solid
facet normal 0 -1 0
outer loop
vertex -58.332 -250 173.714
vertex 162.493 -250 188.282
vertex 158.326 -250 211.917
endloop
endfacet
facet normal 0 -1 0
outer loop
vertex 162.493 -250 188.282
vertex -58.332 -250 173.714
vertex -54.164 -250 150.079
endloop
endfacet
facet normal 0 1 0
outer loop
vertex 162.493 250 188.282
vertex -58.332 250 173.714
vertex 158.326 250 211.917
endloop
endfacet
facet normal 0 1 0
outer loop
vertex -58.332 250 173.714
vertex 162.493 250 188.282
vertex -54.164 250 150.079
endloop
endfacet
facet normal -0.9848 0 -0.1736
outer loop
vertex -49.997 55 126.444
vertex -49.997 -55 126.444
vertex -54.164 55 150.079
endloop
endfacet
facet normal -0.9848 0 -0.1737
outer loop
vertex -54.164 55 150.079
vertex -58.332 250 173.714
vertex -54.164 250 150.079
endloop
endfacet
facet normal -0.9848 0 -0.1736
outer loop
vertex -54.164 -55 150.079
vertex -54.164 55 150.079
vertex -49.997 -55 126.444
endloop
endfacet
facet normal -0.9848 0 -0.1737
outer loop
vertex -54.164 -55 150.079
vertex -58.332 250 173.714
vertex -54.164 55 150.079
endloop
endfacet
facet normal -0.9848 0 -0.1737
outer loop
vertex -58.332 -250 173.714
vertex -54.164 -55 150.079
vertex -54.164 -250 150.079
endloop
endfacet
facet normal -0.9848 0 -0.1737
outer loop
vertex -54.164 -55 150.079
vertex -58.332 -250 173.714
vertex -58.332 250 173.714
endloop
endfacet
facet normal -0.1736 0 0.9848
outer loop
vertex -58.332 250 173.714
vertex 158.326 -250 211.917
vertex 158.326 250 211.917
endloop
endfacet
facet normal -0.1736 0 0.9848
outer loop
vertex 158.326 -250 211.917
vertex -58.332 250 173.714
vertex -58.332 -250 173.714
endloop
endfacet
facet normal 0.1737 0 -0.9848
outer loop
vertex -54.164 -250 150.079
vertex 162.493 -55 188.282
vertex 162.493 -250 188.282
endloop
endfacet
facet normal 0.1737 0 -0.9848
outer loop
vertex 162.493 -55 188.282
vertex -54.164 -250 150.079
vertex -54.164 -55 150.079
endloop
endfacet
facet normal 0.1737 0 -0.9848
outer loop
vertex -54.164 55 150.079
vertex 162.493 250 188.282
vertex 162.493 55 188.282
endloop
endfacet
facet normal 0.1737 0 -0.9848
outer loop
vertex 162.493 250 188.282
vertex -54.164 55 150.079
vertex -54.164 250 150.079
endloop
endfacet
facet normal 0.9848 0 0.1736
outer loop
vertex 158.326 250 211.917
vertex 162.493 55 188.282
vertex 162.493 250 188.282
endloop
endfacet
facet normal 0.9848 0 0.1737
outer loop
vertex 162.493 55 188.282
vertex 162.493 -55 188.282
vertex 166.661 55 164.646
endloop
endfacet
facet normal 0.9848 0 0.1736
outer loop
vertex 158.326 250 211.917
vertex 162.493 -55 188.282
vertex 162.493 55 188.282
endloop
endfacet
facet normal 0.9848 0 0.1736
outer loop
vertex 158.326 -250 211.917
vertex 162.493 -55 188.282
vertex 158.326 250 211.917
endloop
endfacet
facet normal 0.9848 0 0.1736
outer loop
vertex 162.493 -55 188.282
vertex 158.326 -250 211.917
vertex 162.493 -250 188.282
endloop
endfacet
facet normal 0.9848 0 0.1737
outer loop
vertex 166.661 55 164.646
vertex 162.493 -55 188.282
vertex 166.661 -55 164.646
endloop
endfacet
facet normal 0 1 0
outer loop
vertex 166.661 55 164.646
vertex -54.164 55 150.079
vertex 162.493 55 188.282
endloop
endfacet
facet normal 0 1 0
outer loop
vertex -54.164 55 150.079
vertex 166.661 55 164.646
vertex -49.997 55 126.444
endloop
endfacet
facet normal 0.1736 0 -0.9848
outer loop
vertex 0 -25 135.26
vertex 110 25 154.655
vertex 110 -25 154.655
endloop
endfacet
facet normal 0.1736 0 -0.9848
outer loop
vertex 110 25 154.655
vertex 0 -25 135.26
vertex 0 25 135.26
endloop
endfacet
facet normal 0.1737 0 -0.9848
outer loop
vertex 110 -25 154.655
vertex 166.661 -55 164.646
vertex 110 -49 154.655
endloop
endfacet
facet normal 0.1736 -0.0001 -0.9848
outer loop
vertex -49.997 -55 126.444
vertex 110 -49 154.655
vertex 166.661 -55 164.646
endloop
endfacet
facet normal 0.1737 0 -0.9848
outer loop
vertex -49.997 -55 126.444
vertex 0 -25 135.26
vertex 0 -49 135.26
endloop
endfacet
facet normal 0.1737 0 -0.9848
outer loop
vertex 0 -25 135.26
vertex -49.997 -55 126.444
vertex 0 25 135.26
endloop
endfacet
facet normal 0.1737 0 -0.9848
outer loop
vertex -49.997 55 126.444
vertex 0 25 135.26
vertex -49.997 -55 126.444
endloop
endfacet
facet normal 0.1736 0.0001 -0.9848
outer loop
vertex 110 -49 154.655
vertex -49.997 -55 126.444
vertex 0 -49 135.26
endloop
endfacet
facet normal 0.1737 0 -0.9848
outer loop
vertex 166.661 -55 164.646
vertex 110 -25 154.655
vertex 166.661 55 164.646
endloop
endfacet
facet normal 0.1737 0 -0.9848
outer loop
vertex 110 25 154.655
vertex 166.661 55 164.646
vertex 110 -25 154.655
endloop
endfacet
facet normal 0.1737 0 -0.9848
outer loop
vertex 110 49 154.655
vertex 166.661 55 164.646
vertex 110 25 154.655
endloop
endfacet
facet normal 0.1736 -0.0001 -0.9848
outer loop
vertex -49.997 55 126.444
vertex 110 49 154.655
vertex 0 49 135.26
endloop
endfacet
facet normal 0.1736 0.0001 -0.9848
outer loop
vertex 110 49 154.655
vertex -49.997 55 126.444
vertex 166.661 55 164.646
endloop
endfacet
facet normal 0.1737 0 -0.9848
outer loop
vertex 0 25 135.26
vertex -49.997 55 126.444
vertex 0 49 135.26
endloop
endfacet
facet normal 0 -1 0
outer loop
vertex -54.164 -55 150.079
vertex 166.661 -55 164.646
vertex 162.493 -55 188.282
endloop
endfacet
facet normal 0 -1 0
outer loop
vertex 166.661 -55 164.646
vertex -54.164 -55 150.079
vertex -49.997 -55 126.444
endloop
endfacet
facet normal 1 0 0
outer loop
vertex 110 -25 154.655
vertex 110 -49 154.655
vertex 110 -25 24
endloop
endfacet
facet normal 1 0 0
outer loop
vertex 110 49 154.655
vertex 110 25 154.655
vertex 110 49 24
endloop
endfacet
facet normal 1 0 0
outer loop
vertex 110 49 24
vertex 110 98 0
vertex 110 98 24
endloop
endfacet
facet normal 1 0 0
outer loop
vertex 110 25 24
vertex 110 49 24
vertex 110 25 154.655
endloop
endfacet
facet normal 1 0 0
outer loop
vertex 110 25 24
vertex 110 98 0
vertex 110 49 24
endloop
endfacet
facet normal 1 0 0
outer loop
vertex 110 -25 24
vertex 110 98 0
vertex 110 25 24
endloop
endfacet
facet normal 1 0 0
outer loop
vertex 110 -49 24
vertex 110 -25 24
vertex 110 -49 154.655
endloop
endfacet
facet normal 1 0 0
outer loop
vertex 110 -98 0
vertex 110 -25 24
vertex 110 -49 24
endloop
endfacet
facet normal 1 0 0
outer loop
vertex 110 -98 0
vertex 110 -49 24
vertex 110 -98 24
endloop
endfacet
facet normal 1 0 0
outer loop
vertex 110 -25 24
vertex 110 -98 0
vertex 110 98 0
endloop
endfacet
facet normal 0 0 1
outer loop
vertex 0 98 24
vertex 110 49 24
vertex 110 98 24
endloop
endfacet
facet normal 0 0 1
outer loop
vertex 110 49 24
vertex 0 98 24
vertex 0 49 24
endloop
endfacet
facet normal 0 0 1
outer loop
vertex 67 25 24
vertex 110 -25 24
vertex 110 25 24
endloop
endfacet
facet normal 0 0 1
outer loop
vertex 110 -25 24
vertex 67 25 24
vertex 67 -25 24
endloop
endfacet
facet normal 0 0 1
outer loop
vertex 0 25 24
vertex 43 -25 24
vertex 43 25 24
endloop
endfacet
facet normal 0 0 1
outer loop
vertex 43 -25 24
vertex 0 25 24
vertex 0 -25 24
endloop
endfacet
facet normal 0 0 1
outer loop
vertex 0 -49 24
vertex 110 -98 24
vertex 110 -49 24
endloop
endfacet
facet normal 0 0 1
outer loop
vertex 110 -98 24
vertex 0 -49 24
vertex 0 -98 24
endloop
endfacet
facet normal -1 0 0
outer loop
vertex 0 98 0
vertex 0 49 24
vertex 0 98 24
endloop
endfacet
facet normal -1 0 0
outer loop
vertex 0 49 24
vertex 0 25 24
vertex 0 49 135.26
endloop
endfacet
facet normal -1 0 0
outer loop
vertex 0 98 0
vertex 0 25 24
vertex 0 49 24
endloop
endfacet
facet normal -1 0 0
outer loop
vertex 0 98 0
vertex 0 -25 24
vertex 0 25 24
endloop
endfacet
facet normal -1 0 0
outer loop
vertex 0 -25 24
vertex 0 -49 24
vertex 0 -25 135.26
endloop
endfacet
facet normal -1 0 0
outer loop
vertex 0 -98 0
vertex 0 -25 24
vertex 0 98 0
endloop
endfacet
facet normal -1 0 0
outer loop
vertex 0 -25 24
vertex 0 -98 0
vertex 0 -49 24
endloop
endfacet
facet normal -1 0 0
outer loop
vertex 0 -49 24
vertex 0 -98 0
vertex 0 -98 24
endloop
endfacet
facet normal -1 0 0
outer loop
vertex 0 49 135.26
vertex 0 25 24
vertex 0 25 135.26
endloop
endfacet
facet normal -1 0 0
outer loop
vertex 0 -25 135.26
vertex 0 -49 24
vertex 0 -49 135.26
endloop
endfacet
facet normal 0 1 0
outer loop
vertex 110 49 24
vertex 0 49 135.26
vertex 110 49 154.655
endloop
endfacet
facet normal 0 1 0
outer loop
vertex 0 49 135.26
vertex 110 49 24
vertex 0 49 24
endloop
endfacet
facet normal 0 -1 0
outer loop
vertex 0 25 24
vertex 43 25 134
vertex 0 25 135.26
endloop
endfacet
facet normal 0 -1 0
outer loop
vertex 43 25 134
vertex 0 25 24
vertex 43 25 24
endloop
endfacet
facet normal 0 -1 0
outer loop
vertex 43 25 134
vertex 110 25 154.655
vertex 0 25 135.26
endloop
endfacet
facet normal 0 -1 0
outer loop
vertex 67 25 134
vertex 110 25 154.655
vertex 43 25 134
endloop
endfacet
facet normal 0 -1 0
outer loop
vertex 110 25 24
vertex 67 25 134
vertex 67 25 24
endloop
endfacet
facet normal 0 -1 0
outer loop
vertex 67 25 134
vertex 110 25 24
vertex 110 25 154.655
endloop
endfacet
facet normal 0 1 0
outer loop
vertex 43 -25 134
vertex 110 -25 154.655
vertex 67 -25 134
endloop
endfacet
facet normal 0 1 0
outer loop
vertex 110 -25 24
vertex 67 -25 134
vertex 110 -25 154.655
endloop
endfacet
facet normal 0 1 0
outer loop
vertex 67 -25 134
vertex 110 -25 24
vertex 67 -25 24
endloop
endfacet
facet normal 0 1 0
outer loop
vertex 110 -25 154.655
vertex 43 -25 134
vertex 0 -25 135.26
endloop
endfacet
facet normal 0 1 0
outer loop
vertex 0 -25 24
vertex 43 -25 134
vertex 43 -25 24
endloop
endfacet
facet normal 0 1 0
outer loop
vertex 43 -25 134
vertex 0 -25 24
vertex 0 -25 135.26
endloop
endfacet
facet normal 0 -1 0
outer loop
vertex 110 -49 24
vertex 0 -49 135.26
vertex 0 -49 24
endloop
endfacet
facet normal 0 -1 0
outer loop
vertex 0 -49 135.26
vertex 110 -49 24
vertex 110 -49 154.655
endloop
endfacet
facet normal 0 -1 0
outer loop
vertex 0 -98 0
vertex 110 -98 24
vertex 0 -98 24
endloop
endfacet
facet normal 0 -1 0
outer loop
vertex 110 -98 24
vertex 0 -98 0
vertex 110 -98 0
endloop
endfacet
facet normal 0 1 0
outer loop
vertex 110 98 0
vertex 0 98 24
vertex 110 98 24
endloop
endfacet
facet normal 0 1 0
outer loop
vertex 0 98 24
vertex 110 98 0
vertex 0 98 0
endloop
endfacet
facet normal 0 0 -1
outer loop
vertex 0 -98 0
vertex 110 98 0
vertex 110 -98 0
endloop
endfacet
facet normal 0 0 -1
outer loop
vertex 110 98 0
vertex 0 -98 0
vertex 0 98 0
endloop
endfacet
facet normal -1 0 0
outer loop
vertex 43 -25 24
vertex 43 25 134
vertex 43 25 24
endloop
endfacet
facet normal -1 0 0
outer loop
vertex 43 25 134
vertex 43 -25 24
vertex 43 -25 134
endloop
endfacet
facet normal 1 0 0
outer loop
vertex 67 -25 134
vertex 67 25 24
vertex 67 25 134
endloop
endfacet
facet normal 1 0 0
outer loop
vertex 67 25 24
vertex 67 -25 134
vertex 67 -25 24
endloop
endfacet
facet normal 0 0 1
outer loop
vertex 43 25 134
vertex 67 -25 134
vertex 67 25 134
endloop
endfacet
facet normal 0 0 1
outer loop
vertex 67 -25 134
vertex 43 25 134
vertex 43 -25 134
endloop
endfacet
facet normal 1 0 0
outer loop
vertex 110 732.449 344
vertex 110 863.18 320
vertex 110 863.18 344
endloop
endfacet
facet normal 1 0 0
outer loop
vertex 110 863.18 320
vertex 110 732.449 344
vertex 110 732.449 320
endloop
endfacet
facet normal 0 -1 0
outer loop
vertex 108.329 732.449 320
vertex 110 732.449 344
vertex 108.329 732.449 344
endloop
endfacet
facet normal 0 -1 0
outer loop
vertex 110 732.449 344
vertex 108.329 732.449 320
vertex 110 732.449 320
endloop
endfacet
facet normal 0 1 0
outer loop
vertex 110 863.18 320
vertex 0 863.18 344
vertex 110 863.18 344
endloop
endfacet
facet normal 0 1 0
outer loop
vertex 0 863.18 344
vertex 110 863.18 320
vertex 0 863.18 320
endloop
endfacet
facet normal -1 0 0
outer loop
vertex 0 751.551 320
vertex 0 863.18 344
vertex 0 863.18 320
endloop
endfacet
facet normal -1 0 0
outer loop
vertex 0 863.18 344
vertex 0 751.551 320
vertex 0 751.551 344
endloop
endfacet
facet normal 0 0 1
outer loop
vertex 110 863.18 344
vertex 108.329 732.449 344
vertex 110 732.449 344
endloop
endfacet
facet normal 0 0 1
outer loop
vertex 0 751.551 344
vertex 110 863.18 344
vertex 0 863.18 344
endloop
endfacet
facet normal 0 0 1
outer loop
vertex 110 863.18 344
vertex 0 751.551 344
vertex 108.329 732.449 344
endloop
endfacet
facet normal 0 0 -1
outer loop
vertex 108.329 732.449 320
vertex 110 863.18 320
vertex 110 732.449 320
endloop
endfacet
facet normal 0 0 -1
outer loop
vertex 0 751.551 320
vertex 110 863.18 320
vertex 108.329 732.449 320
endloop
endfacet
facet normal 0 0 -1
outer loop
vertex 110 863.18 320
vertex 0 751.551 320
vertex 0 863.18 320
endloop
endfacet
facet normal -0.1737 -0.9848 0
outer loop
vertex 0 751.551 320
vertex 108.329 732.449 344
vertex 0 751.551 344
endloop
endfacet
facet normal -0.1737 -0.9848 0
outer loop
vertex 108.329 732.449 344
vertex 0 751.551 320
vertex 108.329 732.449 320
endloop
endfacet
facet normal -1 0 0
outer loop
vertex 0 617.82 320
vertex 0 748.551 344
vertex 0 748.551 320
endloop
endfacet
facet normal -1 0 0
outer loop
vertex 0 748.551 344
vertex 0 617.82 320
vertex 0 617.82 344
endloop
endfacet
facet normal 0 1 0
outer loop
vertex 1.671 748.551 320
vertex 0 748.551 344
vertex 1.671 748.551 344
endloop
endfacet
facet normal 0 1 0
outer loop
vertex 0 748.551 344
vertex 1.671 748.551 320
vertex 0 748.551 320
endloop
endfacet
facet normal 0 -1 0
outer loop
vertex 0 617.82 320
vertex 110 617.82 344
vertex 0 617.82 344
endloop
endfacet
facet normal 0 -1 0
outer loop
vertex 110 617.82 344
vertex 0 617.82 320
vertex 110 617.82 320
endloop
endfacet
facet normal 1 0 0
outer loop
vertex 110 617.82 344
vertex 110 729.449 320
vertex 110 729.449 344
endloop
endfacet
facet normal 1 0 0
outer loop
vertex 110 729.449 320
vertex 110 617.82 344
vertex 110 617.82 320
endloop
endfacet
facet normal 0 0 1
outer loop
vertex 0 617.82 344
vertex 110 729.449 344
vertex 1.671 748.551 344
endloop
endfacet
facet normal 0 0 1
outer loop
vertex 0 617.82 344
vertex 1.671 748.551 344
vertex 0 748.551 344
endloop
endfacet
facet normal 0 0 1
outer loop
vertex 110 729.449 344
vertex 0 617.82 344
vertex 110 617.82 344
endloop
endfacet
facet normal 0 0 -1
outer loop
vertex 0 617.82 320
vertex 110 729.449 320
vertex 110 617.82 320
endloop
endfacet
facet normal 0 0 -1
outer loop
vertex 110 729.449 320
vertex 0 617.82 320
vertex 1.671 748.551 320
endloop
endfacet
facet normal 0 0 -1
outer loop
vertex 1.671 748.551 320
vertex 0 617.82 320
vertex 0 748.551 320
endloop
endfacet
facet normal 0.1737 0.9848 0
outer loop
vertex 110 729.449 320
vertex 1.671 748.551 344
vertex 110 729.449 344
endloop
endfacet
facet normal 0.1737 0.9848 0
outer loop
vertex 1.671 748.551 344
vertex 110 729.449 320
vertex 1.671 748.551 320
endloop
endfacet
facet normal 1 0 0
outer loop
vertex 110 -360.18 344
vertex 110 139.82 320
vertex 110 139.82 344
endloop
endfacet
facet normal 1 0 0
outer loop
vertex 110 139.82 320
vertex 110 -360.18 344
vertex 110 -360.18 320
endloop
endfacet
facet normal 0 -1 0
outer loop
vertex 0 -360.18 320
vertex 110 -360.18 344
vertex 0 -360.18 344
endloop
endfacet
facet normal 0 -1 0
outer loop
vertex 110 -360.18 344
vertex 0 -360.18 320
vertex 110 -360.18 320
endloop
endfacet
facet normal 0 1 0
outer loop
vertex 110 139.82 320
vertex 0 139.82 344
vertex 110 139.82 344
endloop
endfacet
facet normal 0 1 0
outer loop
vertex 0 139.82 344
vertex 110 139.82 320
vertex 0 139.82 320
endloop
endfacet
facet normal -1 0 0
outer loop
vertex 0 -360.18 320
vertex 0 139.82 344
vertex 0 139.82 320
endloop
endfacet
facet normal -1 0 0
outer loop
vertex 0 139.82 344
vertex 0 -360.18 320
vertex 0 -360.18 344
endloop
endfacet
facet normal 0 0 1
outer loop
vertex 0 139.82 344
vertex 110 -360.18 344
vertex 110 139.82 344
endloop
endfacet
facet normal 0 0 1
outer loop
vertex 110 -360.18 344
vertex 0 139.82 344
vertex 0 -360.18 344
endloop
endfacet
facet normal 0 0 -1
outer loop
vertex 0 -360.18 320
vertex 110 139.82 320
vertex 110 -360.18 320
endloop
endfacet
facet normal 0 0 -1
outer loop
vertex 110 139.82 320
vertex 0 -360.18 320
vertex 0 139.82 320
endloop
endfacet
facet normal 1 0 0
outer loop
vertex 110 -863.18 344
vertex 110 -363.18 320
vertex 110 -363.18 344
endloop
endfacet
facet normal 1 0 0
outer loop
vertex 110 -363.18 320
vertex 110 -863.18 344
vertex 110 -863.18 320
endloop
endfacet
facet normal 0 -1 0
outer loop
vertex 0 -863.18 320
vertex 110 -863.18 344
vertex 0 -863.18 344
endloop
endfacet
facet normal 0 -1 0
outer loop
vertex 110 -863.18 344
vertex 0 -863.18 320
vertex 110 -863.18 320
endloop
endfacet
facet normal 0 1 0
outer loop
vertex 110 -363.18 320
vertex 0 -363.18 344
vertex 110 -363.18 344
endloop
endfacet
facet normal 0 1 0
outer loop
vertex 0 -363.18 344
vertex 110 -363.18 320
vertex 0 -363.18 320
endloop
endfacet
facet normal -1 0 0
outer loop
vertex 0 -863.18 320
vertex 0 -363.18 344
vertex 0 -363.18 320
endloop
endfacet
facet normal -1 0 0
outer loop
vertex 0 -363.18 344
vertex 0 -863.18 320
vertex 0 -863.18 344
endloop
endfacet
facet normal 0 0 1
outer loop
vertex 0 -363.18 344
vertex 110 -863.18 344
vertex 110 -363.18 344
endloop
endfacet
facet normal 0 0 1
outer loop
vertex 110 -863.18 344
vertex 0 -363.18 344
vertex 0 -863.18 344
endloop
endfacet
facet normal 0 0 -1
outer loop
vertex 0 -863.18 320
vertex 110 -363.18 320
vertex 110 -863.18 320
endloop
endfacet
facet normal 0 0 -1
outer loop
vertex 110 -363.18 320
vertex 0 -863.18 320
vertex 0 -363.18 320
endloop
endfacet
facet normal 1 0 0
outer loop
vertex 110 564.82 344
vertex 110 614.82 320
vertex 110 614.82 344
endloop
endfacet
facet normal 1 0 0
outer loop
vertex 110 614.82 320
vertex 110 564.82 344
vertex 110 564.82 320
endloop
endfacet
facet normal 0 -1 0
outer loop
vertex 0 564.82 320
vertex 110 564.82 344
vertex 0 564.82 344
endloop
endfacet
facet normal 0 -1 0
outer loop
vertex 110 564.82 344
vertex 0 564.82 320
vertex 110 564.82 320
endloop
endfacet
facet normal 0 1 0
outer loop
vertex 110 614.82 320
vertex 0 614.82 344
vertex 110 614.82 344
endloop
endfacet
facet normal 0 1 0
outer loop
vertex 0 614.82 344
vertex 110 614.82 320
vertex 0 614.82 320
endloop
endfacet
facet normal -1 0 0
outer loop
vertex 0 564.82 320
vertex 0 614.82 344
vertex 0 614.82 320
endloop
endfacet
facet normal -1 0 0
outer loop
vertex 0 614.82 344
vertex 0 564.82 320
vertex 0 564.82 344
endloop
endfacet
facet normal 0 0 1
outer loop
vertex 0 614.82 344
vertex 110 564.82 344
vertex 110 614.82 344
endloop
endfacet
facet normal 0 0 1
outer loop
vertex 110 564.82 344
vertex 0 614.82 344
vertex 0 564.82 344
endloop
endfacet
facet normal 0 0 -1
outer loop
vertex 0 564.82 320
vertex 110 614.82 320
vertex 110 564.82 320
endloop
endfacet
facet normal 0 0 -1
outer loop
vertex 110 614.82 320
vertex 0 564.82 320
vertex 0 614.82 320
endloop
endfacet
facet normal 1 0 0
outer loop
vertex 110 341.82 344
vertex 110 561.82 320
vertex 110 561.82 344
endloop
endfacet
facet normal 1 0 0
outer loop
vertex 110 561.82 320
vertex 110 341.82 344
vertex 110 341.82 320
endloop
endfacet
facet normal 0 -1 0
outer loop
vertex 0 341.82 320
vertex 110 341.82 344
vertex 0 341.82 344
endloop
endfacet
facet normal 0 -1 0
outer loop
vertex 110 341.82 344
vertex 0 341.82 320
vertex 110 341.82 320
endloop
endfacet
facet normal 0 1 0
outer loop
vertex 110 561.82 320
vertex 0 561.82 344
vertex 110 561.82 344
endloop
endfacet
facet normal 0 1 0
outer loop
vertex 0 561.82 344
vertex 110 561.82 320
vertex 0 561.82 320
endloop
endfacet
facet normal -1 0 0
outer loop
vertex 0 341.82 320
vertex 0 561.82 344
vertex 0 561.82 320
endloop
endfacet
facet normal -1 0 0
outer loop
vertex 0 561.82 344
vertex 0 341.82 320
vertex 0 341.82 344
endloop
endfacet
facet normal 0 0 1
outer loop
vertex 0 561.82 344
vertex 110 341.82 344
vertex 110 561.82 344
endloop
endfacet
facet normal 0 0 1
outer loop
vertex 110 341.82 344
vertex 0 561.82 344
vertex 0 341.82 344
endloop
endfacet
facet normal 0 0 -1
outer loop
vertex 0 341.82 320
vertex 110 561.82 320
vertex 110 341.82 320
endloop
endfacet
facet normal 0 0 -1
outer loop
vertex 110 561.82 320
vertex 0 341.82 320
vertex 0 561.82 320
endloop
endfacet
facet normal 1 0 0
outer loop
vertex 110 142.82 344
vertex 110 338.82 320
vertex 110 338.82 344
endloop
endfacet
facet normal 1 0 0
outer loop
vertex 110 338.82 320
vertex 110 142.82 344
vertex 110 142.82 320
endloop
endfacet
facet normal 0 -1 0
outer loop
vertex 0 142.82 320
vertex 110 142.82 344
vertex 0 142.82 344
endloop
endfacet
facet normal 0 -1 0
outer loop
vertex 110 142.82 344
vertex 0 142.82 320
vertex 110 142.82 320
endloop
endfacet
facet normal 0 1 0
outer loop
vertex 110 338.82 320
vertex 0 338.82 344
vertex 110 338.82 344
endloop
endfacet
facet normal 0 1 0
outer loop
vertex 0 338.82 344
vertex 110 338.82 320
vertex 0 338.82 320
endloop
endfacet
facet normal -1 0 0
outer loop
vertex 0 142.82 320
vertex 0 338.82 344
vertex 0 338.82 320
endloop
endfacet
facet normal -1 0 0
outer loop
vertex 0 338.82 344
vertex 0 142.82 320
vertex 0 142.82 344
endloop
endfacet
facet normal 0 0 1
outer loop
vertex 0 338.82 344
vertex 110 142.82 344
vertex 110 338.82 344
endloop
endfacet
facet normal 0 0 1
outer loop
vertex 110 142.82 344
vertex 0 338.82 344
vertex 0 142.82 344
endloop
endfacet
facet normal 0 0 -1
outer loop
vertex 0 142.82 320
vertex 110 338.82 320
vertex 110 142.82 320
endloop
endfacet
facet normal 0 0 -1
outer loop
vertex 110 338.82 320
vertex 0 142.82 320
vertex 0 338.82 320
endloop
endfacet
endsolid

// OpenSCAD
// MeditationSeat.scad - A simple Meditation seat,
// requireing only one size of planks (+ screws).
// This is a 3D Model (CAD), which can be edited
// with the free software OpenSCAD.
//
// License:
//   Name: Creative Commons Attribution Share Alike 4.0 International
//   URL: https://creativecommons.org/licenses/by-sa/4.0/legalcode
//   SPDX-Identifier: CC-BY-SA-4.0
// Author: Robin Vobruba <robin.vobruba@gmail.com>
//
// NOTE
// The most important parameters

angle = 10; // [degrees]
plankWidth = 110; // [mm]
plankHeight = 24; // [mm]
lengthUpper = 500; // [mm]
lengthLower = 196; // [mm]
heightLower = 160; // [mm]
sawWidth = 3; // [mm]
seatFolds = 2; // 1, 2, 3, ...

// WARNING
// If you make changes after this line, things might go wrong.

SHOW_WORK_TEMPLATE = true;
SHOW_ASSEMBLED = true;

legLower = heightLower - (plankHeight * (1 + 1/cos(angle))); // [mm]
legUpper = legLower + (plankWidth * sin(angle)); // [mm]
legDist = lengthLower/2 - 2*plankHeight; // [mm]
totalLength =
	(lengthUpper + sawWidth) * seatFolds +
	(plankWidth * seatFolds + sawWidth) * sign(seatFolds - 1) +
	lengthLower + sawWidth +
	legLower + sawWidth +
	legDist + sawWidth +
	legUpper; // [mm]
BIG = 1000; // [mm]
siThick = 1; // [mm]
siWidth = 10; // [mm]
siStick = 15; // [mm]



if (SHOW_ASSEMBLED) {
	MeditationSeat();
}

if (SHOW_WORK_TEMPLATE && SHOW_ASSEMBLED) {
	color("red")
	translate([0, 0, heightLower/2])
	bigLabel("Assembled");

	color("green")
	translate([0, 0, 2*heightLower])
	bigLabel("Work-Template");
}

if (SHOW_WORK_TEMPLATE) {
	translate([0, totalLength / 2, 2*heightLower])
	rotate([90, 0, 0])
	MeditationSeatParts();
}



// Big textual label
module bigLabel(label, size=50) {
		
		%rotate([90, 0, 90])
		translate([(-(len(label) - 2) * size) / 2, 0, plankWidth + size])
		text(label, size, "Courier New");
	}

// A piece of plank
module plank(length) {

		cube([plankWidth, plankHeight, length]);
	}

// A piece of size indicator "band"
module si(length) {

		translate([-siWidth/2, 0, 0])
			cube([siWidth, siThick, length]);
	}

// The part touching the bottom
module sizeIndicator(size, label, labelInv=true) {

		labelStr = is_undef(label) ?
			str(round(size) / 10.0, "cm") :
			label;

		translate([0, -siStick, 0])
		%union() {
			si(size);
			translate([0, siStick, 0])
				rotate([90, 0, 0])
				si(siStick);
			translate([0, siStick, size - siThick])
				rotate([90, 0, 0])
				si(siStick);
			translate([0, 0, (size - siThick) / 2])
				rotate([90, 0, 0])
				si(siStick);
			translate([0, -(siStick + siThick), (size - siThick + ((len(labelStr) - 1) * siWidth)) / 2])
				translate([0, labelInv ? -siWidth : 0, 0])
				rotate([labelInv ? 0 : 180, 90, 0])
				text(labelStr, siWidth, "Courier New");
		}
	}
	
// The part touching the bottom
module bottom() {
		plank(lengthUpper);
	
		translate([plankWidth/2, 0, 0])
		sizeIndicator(lengthUpper);
	}

module bottomStacked() {

	// The part touching the bottom
	for (sfi = [0 : seatFolds-1]) {
		let (xBottomI = sfi * plankWidth)
		{ // TODO
			translate([xBottomI - ((seatFolds - 1) * plankWidth / 2), 0, 0])
			bottom();
		}
	}
	
	if (sign(seatFolds - 1) > 0) {
		rotate([0, -90, 0])
		translate([(lengthUpper - plankWidth) / 2, -plankHeight, -(seatFolds/2 + 0.5) * plankWidth])
		uniter();
	}
}

// The part touching the ground
module ground() {
		plank(lengthLower);
	
		translate([plankWidth/2, 0, 0])
		sizeIndicator(lengthLower);
	}

// The part holding the bottom-touching-parts together.
// This is only used in case of seatFolds > 1.
module uniter() {
		uniterLength = plankWidth * seatFolds;
		plank(uniterLength);
	
		translate([plankWidth/2, 0, 0])
		sizeIndicator(uniterLength);
	}

// A leg
module leg() {
		difference() {
			plank(legUpper);
		
			// This makes the legs angled
			translate([0, BIG/2, legLower])
			rotate([0, -angle, 0])
			rotate([90, 0, 0])
			cube([BIG, BIG, BIG]);
		}
	
		translate([plankWidth - siWidth/2, 0, 0])
		sizeIndicator(legUpper);
	
		translate([siWidth/2, 0, 0])
		sizeIndicator(legLower);
	}
	
// The leg connector
module bridge() {
		plank(legDist);
	
		translate([plankWidth/2, 0, 0])
		sizeIndicator(legDist);
	}

module MeditationSeatParts() {
	
	leg();
	
	posLeg2 = legUpper + legLower + sawWidth;
	translate([plankWidth, 0, posLeg2])
	rotate([0, 180, 0])
	leg();
	
	posBridge = posLeg2 + sawWidth;
	translate([0, 0, posBridge])
	bridge();
	
	posGround1 = posBridge + legDist + sawWidth;
	
	posUniter = posBridge + legDist + sawWidth;
	if (seatFolds > 1) {
		translate([0, 0, posUniter])
		uniter();
	}
	
	posGround2 = posUniter + (plankWidth * seatFolds) + sawWidth;
	
	posGround = (seatFolds == 1) ? posGround1 : posGround2;
	
	echo(posGround);
	
	translate([0, 0, posGround])
	ground();
	
	posBottom0 = posGround + lengthLower + sawWidth;
	for (sfi = [0 : seatFolds-1]) {
		let (posBottomI = posBottom0 + sfi * (lengthUpper + sawWidth)) {
			translate([0, 0, posBottomI])
			bottom();
		}
	}
	
	posEnd = posBottom0 + lengthUpper + (seatFolds - 1) * (lengthUpper + sawWidth);
		
	translate([-siWidth/2, 0, 0])
	sizeIndicator(totalLength);
	
	translate([0, plankHeight, 0])
	rotate([90, 90, 0])
	sizeIndicator(plankHeight);
	
	translate([0, plankHeight/2, 0])
	rotate([0, 90, 0])
	rotate([0, 0, 90])
	sizeIndicator(plankWidth);
}

module MeditationSeat() {

	// The part touching the bottom
	translate([0, lengthUpper/2, legLower + (1 + sign(seatFolds - 1)) * plankHeight])
	rotate([0, -angle, 0])
	rotate([90, 0, 0])
	bottomStacked();
	
	// The part touching the ground
	translate([0, lengthLower/2, 0])
	rotate([90, 0, 0])
	ground();
	
	translate([0, legDist/2, plankHeight])
	leg();
	
	translate([0, -legDist/2 - plankHeight, plankHeight])
	leg();
	
	rotate([90, 0, 0])
	translate([(plankWidth + plankHeight) / 2, plankHeight, -legDist/2])
	rotate([0, 0, 90])
	bridge();
}
